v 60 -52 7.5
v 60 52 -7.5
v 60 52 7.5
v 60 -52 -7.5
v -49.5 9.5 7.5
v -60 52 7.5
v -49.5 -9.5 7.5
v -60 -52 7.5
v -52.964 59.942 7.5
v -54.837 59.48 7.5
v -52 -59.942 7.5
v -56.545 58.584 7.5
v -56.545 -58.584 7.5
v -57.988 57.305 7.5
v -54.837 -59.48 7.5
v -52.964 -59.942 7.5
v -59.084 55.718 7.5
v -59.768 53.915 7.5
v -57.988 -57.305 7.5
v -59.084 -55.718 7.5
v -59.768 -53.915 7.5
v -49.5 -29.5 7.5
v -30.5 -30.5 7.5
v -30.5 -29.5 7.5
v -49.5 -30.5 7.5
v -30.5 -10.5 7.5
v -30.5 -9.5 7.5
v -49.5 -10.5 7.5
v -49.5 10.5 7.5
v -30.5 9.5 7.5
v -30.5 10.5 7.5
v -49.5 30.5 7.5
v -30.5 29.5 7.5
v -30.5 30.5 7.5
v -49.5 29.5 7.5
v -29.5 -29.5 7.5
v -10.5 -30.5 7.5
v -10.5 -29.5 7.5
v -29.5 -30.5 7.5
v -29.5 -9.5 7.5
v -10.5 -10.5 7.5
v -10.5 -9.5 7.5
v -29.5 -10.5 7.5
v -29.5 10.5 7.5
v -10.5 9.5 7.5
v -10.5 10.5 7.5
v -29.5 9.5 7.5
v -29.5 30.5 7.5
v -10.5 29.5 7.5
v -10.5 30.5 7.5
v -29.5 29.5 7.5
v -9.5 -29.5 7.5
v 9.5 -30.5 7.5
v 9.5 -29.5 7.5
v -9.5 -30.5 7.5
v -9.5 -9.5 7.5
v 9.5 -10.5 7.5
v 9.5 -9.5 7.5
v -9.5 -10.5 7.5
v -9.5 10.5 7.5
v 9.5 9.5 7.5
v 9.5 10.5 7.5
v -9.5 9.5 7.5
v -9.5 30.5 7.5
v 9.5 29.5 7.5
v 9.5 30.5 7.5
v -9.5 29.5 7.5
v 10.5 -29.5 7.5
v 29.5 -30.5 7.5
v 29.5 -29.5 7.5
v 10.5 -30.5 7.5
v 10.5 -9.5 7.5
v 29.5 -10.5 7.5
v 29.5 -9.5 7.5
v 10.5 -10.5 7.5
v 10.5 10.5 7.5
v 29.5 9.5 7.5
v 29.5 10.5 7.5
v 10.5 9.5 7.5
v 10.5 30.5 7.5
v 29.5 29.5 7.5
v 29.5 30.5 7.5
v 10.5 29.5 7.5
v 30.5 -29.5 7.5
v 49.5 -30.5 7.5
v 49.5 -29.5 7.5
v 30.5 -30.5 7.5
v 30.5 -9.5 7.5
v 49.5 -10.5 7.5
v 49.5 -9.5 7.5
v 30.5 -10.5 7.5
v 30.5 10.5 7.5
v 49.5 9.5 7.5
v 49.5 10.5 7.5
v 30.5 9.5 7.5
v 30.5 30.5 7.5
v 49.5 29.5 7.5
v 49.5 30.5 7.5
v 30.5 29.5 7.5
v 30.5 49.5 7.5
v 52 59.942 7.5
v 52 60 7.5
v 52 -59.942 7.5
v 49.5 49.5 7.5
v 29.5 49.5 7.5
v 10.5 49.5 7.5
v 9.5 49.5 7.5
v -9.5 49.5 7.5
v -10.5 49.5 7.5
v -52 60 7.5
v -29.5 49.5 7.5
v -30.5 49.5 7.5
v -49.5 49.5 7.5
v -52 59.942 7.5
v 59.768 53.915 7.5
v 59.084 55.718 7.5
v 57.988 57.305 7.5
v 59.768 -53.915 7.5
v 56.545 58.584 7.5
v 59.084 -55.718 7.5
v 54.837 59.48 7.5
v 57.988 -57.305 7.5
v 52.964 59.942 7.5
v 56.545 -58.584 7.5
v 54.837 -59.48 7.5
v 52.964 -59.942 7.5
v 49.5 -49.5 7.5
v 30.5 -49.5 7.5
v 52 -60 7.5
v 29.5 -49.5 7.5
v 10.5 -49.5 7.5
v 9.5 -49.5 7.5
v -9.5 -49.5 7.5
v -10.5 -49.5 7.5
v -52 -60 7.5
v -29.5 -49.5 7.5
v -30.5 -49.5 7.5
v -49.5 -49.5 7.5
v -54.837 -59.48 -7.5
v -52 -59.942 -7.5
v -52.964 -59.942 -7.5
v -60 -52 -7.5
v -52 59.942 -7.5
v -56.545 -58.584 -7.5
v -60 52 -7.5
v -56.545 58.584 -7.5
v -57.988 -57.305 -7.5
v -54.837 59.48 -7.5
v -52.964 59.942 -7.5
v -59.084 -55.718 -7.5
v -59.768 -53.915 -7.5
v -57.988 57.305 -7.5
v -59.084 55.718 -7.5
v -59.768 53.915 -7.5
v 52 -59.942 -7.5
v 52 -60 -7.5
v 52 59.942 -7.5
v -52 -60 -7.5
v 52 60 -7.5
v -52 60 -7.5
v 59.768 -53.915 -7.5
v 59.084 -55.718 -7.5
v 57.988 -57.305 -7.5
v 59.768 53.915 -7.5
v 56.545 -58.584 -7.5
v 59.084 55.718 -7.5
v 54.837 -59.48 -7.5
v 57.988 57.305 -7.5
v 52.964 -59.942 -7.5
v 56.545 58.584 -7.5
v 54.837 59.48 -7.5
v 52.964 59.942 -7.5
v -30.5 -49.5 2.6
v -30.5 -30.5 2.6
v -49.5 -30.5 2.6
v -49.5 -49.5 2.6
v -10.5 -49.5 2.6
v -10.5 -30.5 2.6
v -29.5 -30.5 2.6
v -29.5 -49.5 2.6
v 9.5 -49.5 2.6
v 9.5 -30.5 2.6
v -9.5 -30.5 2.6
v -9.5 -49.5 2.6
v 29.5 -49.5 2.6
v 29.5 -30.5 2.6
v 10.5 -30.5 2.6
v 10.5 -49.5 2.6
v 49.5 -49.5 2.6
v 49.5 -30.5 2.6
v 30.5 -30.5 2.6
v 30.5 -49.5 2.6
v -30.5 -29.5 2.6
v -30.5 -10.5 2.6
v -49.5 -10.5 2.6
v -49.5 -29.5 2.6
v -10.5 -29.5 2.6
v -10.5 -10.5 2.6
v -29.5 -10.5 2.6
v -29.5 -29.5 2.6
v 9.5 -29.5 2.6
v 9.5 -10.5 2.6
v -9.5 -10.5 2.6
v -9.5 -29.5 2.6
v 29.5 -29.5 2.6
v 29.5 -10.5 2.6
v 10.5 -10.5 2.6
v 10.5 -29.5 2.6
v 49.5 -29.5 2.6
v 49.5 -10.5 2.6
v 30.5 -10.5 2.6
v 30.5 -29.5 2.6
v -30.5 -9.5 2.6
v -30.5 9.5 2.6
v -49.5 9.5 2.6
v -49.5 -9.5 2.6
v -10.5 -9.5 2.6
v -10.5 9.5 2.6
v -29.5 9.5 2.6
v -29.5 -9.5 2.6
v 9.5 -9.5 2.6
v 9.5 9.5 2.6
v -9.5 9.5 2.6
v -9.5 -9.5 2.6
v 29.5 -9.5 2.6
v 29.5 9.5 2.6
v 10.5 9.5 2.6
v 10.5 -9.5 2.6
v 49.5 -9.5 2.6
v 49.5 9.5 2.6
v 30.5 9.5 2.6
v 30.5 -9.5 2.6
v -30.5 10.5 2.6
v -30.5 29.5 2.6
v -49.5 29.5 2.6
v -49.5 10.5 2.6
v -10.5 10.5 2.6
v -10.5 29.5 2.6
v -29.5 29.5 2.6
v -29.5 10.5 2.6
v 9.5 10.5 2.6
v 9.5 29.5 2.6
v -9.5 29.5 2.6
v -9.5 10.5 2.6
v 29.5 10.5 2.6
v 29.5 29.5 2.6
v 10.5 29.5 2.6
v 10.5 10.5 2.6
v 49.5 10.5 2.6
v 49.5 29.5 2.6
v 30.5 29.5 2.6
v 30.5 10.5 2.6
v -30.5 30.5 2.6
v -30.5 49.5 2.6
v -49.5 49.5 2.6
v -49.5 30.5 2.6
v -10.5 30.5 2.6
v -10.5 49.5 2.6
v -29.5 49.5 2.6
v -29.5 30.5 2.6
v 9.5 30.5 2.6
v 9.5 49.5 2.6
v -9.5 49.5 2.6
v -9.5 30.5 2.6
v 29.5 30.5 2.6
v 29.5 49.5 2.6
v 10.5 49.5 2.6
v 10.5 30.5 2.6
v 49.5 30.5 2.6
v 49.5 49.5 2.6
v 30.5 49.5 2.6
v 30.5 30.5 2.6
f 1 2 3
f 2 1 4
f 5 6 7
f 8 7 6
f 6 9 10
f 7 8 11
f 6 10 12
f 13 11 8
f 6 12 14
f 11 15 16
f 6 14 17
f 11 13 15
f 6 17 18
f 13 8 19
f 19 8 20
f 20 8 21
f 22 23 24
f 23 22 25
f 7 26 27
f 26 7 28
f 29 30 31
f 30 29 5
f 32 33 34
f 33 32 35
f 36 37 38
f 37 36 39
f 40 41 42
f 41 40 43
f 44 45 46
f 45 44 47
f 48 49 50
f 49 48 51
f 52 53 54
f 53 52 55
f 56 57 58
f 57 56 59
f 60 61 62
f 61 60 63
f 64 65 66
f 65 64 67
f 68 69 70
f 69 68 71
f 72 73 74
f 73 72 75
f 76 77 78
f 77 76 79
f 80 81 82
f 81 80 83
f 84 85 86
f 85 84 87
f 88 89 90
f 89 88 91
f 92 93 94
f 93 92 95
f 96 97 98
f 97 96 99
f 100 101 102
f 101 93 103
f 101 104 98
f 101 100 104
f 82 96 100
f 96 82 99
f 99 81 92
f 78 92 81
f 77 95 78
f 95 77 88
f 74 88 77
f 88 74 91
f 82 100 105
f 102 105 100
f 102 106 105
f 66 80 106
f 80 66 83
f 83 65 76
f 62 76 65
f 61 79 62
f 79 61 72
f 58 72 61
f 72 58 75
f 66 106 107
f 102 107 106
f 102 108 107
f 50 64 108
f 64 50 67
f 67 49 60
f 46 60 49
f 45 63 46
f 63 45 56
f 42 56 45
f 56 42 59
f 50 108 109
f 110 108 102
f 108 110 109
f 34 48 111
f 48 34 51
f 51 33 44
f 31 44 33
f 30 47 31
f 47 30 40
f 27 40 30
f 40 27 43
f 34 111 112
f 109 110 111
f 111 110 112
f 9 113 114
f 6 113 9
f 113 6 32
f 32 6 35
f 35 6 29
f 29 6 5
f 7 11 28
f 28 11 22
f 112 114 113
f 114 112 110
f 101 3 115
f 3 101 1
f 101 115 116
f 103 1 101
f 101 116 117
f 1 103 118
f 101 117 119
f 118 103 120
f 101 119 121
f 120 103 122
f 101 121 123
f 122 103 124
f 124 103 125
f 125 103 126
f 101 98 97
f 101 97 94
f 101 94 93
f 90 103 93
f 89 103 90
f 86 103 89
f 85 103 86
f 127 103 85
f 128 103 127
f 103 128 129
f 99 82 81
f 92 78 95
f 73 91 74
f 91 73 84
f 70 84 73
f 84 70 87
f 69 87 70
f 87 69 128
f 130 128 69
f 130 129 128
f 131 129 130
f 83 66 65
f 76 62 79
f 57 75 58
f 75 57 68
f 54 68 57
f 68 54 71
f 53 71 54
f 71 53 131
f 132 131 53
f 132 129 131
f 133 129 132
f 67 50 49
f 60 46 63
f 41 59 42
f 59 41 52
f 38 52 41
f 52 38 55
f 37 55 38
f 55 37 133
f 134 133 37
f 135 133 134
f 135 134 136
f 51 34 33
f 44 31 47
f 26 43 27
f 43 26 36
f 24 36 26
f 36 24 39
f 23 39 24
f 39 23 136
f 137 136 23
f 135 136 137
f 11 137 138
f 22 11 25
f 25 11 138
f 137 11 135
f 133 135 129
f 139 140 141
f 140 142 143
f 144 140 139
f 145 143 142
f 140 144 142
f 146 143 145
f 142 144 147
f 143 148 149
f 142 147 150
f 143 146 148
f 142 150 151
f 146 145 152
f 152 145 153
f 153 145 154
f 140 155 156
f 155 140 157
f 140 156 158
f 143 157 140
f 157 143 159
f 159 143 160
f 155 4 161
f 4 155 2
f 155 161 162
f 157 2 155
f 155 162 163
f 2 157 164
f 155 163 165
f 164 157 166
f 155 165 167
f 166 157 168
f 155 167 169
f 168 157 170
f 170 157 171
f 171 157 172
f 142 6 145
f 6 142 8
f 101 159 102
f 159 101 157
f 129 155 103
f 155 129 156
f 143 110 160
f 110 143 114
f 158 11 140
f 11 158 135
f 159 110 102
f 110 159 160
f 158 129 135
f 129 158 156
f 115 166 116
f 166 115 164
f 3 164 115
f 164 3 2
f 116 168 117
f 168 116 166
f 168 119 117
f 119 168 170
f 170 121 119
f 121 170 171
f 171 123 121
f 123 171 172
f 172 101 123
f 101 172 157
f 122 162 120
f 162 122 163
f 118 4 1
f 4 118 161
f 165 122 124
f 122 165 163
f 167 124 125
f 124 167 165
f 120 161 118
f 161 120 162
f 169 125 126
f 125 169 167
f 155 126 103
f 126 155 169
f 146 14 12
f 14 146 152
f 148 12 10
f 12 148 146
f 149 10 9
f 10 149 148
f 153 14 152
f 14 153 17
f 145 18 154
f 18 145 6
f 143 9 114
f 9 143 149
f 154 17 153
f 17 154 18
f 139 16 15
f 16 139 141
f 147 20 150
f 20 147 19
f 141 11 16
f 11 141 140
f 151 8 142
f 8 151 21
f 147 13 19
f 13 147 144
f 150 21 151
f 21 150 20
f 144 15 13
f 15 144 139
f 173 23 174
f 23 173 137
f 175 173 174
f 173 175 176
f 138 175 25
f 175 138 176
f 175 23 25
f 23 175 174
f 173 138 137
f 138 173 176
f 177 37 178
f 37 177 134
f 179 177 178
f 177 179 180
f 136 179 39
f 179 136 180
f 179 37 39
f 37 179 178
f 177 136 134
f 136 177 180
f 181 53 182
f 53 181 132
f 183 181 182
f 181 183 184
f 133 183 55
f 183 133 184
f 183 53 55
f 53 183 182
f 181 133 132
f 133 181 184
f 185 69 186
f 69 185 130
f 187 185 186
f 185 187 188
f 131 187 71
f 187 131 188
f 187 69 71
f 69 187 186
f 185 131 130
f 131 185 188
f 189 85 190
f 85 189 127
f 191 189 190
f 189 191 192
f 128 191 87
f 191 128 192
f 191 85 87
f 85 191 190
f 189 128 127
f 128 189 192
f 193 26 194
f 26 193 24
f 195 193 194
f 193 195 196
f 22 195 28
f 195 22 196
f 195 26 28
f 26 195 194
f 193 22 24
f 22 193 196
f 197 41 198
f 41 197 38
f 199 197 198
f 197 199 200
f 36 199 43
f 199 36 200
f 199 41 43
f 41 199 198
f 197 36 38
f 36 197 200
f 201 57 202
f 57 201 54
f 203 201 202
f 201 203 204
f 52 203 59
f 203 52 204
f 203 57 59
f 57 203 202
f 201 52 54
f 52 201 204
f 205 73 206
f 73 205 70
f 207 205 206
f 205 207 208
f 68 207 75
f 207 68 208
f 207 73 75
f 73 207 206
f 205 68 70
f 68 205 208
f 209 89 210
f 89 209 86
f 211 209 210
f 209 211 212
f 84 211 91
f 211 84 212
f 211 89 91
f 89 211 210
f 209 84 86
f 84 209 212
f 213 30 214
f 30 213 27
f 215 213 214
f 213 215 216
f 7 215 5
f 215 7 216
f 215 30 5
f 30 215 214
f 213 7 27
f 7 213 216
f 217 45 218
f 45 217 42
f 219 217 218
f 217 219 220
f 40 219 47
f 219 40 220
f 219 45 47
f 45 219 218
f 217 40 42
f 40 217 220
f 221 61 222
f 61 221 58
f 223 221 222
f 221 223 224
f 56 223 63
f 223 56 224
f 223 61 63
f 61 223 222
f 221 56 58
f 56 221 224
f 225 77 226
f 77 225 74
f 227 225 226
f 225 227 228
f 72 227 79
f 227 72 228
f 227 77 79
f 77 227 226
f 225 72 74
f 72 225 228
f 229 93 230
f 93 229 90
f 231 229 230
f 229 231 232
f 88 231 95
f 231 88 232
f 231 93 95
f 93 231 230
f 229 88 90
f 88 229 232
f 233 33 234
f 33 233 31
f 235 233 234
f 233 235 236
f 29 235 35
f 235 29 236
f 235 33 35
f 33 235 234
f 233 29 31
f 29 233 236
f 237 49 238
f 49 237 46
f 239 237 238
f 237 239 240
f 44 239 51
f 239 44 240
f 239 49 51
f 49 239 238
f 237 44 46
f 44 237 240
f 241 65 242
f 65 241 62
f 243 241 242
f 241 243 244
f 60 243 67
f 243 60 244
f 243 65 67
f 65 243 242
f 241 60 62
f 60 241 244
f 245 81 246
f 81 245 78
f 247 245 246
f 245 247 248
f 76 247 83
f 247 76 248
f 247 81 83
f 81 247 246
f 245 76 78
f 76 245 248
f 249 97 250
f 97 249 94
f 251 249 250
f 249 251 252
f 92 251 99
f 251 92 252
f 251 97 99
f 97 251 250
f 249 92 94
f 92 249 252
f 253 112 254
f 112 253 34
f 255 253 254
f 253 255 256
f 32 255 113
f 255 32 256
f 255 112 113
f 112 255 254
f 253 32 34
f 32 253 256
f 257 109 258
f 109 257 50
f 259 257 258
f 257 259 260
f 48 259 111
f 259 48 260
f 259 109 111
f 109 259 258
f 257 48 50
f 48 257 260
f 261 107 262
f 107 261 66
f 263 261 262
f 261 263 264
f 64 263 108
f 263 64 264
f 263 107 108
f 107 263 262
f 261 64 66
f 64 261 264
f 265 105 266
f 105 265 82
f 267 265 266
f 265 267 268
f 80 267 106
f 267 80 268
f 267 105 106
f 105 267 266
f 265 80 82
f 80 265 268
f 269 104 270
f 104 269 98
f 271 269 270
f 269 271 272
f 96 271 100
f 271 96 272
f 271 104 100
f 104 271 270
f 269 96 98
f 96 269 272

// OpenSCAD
w = 150; h = 100; d = 20; r = 10; wh_offset = 7;

/*color("tomato") difference(){
    base(w, h, r=r, depth=d);
    translate([0, 0, d/2]){
        color("lime") base(w - wh_offset, h - wh_offset, r=r, depth=5);
    }
}*/
nSquares = 5;
squareWidth = 20;
pieceOffset = 1;
depthCulled = 5;
depthBoard = 15;
startHeight = depthBoard/2;
marginBoard = 10;
radiusBoard = marginBoard * 0.8;

color("tomato") difference(){
    widthBoard = nSquares * squareWidth + (marginBoard * 2);
    color("tomato") base(x_width=widthBoard, y_height=widthBoard, r=radiusBoard, depth=depthBoard);
    
    squares(nSquares=nSquares, squareWidth=squareWidth, pieceOffset=pieceOffset, depth=depthCulled, startHeight=startHeight);
}

module base(x_width, y_height, r, depth) {
    union(){
        color("lime") cube([x_width, y_height-(2*r), depth], center = true);
        color("aqua") cube([x_width-(2*r), y_height, depth], center = true);
        translate([(x_width/2 - r), (y_height/2 - r), 0]){
            color("red") cylinder(h=depth, r1=r, r2=r, center = true);
        }
        translate([(x_width/2 - r), -(y_height/2 - r), 0]){
            color("red") cylinder(h=depth, r1=r, r2=r, center = true);
        }
        translate([-(x_width/2 - r), (y_height/2 - r), 0]){
            color("red") cylinder(h=depth, r1=r, r2=r, center = true);
        }
        translate([-(x_width/2 - r), -(y_height/2 - r), 0]){
            color("red") cylinder(h=depth, r1=r, r2=r, center = true);
        }
    }
}

module squares(nSquares, squareWidth, pieceOffset, depth, startHeight){
    slide = (pieceOffset / 2) - (squareWidth * (nSquares / 2));
    translate([slide, slide, startHeight - depth +0.1])
    //translate([0, 0, startHeight - depth +2])
    for ( row = [0 : nSquares - 1] )
    {
        for ( col = [0 : nSquares - 1] )
        {
            translate([col*squareWidth, row*squareWidth, 0]){
                cube([squareWidth - pieceOffset, squareWidth - pieceOffset, depth]);
            }
        }
    }
}

//color("tomato")
